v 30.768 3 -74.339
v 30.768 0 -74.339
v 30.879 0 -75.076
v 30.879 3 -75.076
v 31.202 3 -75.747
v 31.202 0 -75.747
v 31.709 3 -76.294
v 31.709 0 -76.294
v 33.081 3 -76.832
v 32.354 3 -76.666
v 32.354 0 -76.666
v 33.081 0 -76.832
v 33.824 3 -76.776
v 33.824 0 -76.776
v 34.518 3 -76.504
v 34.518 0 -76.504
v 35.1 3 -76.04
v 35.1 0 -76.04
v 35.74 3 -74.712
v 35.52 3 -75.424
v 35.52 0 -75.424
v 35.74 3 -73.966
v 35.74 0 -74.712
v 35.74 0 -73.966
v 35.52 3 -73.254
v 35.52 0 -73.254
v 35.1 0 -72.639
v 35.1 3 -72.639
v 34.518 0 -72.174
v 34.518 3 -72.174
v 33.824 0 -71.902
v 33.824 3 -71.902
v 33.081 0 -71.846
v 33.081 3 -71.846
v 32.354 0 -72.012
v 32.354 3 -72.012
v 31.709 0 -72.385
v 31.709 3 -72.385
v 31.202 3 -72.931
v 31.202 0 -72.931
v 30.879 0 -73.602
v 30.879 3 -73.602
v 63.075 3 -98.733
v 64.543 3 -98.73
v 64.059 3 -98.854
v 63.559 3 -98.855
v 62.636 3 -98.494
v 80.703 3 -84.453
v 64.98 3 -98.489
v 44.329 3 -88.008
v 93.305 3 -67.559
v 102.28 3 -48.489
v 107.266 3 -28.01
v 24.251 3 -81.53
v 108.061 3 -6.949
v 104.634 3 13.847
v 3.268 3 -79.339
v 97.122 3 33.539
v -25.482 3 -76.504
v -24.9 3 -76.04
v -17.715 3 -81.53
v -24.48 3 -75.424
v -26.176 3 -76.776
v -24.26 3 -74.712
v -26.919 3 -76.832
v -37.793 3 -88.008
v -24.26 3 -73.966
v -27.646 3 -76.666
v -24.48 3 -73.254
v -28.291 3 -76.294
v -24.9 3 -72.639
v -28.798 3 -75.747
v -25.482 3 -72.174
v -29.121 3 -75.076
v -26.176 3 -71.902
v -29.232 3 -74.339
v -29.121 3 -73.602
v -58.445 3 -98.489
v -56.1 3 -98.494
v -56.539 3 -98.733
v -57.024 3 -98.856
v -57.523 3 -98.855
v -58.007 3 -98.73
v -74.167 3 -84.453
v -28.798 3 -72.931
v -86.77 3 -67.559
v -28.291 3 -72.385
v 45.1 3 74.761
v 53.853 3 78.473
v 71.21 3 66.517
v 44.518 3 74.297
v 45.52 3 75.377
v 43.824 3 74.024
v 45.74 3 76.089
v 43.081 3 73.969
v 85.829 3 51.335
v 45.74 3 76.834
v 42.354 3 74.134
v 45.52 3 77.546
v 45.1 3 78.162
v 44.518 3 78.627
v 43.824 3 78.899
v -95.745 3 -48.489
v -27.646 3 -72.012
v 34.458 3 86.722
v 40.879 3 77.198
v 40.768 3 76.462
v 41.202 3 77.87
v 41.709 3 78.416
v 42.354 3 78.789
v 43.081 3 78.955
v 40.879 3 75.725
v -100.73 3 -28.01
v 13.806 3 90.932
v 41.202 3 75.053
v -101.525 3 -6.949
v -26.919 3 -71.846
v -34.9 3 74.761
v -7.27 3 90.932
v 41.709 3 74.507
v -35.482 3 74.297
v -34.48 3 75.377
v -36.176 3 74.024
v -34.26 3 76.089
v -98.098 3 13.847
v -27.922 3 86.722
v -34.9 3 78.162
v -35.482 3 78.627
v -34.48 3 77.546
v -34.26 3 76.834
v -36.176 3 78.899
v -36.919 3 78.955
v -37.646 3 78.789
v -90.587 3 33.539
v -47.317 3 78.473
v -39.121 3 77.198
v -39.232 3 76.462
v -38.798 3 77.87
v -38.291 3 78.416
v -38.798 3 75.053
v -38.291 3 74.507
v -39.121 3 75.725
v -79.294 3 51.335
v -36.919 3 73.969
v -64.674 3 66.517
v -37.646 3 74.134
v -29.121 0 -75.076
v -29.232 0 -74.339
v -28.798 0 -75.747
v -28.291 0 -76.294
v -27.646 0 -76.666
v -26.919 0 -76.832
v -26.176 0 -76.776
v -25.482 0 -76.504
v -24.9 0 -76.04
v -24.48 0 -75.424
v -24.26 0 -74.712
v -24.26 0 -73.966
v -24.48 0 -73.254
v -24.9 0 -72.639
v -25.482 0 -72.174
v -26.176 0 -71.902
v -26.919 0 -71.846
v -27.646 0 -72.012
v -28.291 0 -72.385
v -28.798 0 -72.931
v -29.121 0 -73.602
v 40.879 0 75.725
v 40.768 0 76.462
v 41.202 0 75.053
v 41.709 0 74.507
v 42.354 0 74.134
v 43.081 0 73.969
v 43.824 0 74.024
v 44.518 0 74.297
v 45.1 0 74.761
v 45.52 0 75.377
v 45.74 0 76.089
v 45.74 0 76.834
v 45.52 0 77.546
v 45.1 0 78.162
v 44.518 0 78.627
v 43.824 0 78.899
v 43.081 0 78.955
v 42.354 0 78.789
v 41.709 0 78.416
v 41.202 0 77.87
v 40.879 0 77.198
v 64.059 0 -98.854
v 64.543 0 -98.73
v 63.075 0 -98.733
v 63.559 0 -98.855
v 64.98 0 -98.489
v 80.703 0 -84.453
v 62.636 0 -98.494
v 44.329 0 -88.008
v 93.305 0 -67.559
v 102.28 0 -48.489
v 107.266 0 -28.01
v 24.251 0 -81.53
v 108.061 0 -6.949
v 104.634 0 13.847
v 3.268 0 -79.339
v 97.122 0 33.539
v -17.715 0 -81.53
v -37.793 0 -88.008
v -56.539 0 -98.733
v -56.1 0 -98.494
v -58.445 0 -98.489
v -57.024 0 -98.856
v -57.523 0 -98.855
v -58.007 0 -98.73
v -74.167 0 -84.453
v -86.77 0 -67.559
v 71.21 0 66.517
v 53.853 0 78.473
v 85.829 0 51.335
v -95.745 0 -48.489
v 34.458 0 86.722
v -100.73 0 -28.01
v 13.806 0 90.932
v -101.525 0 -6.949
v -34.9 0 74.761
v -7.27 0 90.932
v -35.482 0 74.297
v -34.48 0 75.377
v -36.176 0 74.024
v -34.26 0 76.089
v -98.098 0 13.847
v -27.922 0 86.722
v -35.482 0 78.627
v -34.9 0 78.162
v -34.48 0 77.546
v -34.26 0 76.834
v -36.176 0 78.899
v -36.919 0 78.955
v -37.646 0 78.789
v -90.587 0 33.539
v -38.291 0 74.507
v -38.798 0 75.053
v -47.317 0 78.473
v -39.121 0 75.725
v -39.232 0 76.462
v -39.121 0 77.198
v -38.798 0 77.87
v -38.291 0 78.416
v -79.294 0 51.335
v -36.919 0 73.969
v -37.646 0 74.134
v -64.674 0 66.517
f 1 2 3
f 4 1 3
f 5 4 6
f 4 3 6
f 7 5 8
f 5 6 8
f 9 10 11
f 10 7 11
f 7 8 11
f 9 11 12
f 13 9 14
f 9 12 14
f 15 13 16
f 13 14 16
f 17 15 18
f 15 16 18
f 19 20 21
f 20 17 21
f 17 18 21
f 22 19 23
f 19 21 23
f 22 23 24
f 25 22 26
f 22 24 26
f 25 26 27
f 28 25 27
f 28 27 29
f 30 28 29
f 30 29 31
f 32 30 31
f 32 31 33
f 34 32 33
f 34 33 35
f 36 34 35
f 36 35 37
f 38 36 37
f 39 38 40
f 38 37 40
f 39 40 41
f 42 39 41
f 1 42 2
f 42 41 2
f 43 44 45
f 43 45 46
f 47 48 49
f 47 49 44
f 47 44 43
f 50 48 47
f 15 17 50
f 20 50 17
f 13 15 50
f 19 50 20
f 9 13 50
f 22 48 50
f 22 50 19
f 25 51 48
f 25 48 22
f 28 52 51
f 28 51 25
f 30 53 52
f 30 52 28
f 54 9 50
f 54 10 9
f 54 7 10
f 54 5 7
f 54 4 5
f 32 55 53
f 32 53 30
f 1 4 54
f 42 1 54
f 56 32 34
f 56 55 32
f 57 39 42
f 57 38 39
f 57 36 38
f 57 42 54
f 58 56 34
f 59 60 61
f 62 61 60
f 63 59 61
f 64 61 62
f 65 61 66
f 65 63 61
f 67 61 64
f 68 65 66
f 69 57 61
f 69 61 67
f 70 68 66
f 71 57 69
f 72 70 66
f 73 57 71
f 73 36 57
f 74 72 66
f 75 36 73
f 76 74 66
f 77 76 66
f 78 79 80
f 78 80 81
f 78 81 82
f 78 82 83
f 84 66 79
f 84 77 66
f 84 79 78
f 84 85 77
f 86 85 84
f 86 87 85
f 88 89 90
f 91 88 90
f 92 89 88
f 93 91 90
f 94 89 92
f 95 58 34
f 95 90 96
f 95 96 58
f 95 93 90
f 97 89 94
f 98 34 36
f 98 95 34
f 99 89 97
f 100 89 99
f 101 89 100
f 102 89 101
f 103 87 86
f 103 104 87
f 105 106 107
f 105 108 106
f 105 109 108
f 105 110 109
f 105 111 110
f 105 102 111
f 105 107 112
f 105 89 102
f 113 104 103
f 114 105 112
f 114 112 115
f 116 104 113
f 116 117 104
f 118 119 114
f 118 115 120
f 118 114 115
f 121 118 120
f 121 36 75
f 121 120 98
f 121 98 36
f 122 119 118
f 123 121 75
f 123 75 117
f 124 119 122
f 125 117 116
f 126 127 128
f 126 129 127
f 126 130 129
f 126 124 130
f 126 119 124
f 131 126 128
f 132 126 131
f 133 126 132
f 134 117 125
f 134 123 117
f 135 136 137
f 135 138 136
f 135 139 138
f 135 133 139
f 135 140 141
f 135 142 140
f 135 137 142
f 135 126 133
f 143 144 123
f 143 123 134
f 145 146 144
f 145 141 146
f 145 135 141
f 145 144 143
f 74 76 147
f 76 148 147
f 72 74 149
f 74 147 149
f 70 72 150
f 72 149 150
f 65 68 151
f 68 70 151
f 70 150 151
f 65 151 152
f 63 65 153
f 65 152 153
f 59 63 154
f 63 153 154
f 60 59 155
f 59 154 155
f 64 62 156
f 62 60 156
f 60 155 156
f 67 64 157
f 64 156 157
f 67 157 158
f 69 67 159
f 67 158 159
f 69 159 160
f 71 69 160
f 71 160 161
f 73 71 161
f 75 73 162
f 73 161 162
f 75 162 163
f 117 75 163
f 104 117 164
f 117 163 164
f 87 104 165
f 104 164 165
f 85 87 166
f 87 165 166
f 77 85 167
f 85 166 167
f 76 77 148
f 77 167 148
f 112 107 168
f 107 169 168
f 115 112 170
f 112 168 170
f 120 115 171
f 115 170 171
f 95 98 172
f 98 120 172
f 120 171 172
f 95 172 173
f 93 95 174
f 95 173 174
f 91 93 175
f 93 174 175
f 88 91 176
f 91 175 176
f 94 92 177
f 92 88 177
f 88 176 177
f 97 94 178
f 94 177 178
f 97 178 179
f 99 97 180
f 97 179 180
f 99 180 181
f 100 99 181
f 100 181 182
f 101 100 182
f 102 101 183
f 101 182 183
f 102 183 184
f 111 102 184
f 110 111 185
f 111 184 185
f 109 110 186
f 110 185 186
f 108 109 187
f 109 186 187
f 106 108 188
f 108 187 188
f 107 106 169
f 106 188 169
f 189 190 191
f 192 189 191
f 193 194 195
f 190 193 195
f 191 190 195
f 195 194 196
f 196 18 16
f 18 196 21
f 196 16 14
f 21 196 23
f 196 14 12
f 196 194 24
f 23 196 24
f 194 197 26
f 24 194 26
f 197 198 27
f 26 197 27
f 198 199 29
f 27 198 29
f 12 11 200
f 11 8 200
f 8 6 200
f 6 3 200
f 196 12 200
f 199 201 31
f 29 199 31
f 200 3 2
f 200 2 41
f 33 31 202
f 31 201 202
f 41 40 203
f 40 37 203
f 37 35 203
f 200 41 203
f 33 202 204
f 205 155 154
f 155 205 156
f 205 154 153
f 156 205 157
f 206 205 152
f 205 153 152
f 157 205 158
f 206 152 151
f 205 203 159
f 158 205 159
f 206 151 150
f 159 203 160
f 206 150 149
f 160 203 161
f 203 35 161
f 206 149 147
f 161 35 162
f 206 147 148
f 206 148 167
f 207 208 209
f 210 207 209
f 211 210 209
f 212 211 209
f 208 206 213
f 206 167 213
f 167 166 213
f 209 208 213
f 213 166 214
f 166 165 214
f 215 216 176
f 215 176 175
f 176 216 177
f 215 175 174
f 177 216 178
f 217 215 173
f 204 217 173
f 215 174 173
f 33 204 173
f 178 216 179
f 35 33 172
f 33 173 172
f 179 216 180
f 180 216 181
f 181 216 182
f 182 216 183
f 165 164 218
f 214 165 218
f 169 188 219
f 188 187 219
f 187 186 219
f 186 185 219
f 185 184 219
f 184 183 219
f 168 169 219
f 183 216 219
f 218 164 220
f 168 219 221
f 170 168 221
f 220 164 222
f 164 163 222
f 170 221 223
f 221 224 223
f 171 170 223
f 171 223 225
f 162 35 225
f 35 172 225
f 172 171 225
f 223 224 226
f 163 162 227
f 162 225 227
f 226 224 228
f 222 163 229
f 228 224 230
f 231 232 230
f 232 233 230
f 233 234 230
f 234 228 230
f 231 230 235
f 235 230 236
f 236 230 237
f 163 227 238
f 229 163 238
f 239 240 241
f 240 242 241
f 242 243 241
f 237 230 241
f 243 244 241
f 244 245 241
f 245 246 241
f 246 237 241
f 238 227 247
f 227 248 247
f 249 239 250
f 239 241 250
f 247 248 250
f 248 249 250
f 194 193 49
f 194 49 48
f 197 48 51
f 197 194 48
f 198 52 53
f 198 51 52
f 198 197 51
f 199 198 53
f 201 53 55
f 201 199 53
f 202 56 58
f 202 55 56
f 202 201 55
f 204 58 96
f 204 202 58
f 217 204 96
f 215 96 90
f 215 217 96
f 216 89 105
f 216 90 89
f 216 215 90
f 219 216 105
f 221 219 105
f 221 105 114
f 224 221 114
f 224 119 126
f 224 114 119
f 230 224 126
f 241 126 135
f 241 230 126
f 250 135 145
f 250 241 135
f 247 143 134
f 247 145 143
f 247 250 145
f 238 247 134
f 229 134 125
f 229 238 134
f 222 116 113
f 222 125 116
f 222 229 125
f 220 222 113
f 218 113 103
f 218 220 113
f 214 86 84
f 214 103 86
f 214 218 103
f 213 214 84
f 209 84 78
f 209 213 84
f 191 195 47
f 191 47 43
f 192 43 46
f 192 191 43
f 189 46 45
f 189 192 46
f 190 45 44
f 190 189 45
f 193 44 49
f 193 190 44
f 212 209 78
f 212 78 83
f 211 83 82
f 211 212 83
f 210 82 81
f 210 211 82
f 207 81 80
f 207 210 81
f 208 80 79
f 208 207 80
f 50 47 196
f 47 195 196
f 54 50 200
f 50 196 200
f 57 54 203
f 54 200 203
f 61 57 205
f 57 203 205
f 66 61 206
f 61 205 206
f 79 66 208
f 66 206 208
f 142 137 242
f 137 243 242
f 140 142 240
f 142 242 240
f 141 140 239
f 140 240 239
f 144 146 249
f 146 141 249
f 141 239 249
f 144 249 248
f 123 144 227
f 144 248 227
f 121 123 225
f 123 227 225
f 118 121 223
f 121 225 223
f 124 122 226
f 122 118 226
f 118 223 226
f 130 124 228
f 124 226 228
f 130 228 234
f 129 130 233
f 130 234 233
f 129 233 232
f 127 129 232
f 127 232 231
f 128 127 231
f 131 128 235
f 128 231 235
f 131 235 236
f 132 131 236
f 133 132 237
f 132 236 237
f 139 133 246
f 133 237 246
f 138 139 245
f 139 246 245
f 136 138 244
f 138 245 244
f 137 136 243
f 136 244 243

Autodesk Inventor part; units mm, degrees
ref_plane "YZ Plane" through (0, 0, 0) normal (1, 0, 0) x (0, 1, 0)
ref_plane "XZ Plane" through (0, 0, 0) normal (0, 1, 0) x (-1, 0, 0)
ref_plane "XY Plane" through (0, 0, 0) normal (0, 0, 1) x (1, 0, 0)
sketch "Sketch1" plane through (0, 0, 0) normal (0, 1, 0) x (-1, 0, 0)
  arc A0 (56.1004, -98.4936) -> (58.4448, -98.4888) centre (57.2693, -96.8707) ccw
  arc A1 (56.1004, -98.4936) -> (-62.636, -98.4936) centre (-3.2678, -180.9204) ccw
  arc A2 (-64.9803, -98.4888) -> (-62.636, -98.4936) centre (-63.8049, -96.8707) ccw
  circle A3 centre (-33.2678, -74.3391) radius 2.5
  circle A4 centre (26.7322, -74.3391) radius 2.5
  circle A5 centre (-43.2678, 76.4616) radius 2.5
  circle A6 centre (36.7322, 76.4616) radius 2.5
  arc A7 (58.4448, -98.4888) -> (-64.9803, -98.4888) centre (-3.2678, -13.5384) ccw
  circle A8 centre (-33.2678, -74.3391) radius 2.5
  circle A9 centre (26.7322, -74.3391) radius 2.5
  circle A10 centre (-33.2678, -74.3391) radius 2.5
  circle A11 centre (26.7322, -74.3391) radius 2.5
  point P0 (0, 0)
  dimension "d25" = 90
  dimension "d26" = 40
  dimension "d27" = 90
  dimension "d28" = 40
extrude "Extrusion5" add sketch "Sketch1" along normal blind 3
properties part number "Middle plate" material "Polycarbonate, Clear"
